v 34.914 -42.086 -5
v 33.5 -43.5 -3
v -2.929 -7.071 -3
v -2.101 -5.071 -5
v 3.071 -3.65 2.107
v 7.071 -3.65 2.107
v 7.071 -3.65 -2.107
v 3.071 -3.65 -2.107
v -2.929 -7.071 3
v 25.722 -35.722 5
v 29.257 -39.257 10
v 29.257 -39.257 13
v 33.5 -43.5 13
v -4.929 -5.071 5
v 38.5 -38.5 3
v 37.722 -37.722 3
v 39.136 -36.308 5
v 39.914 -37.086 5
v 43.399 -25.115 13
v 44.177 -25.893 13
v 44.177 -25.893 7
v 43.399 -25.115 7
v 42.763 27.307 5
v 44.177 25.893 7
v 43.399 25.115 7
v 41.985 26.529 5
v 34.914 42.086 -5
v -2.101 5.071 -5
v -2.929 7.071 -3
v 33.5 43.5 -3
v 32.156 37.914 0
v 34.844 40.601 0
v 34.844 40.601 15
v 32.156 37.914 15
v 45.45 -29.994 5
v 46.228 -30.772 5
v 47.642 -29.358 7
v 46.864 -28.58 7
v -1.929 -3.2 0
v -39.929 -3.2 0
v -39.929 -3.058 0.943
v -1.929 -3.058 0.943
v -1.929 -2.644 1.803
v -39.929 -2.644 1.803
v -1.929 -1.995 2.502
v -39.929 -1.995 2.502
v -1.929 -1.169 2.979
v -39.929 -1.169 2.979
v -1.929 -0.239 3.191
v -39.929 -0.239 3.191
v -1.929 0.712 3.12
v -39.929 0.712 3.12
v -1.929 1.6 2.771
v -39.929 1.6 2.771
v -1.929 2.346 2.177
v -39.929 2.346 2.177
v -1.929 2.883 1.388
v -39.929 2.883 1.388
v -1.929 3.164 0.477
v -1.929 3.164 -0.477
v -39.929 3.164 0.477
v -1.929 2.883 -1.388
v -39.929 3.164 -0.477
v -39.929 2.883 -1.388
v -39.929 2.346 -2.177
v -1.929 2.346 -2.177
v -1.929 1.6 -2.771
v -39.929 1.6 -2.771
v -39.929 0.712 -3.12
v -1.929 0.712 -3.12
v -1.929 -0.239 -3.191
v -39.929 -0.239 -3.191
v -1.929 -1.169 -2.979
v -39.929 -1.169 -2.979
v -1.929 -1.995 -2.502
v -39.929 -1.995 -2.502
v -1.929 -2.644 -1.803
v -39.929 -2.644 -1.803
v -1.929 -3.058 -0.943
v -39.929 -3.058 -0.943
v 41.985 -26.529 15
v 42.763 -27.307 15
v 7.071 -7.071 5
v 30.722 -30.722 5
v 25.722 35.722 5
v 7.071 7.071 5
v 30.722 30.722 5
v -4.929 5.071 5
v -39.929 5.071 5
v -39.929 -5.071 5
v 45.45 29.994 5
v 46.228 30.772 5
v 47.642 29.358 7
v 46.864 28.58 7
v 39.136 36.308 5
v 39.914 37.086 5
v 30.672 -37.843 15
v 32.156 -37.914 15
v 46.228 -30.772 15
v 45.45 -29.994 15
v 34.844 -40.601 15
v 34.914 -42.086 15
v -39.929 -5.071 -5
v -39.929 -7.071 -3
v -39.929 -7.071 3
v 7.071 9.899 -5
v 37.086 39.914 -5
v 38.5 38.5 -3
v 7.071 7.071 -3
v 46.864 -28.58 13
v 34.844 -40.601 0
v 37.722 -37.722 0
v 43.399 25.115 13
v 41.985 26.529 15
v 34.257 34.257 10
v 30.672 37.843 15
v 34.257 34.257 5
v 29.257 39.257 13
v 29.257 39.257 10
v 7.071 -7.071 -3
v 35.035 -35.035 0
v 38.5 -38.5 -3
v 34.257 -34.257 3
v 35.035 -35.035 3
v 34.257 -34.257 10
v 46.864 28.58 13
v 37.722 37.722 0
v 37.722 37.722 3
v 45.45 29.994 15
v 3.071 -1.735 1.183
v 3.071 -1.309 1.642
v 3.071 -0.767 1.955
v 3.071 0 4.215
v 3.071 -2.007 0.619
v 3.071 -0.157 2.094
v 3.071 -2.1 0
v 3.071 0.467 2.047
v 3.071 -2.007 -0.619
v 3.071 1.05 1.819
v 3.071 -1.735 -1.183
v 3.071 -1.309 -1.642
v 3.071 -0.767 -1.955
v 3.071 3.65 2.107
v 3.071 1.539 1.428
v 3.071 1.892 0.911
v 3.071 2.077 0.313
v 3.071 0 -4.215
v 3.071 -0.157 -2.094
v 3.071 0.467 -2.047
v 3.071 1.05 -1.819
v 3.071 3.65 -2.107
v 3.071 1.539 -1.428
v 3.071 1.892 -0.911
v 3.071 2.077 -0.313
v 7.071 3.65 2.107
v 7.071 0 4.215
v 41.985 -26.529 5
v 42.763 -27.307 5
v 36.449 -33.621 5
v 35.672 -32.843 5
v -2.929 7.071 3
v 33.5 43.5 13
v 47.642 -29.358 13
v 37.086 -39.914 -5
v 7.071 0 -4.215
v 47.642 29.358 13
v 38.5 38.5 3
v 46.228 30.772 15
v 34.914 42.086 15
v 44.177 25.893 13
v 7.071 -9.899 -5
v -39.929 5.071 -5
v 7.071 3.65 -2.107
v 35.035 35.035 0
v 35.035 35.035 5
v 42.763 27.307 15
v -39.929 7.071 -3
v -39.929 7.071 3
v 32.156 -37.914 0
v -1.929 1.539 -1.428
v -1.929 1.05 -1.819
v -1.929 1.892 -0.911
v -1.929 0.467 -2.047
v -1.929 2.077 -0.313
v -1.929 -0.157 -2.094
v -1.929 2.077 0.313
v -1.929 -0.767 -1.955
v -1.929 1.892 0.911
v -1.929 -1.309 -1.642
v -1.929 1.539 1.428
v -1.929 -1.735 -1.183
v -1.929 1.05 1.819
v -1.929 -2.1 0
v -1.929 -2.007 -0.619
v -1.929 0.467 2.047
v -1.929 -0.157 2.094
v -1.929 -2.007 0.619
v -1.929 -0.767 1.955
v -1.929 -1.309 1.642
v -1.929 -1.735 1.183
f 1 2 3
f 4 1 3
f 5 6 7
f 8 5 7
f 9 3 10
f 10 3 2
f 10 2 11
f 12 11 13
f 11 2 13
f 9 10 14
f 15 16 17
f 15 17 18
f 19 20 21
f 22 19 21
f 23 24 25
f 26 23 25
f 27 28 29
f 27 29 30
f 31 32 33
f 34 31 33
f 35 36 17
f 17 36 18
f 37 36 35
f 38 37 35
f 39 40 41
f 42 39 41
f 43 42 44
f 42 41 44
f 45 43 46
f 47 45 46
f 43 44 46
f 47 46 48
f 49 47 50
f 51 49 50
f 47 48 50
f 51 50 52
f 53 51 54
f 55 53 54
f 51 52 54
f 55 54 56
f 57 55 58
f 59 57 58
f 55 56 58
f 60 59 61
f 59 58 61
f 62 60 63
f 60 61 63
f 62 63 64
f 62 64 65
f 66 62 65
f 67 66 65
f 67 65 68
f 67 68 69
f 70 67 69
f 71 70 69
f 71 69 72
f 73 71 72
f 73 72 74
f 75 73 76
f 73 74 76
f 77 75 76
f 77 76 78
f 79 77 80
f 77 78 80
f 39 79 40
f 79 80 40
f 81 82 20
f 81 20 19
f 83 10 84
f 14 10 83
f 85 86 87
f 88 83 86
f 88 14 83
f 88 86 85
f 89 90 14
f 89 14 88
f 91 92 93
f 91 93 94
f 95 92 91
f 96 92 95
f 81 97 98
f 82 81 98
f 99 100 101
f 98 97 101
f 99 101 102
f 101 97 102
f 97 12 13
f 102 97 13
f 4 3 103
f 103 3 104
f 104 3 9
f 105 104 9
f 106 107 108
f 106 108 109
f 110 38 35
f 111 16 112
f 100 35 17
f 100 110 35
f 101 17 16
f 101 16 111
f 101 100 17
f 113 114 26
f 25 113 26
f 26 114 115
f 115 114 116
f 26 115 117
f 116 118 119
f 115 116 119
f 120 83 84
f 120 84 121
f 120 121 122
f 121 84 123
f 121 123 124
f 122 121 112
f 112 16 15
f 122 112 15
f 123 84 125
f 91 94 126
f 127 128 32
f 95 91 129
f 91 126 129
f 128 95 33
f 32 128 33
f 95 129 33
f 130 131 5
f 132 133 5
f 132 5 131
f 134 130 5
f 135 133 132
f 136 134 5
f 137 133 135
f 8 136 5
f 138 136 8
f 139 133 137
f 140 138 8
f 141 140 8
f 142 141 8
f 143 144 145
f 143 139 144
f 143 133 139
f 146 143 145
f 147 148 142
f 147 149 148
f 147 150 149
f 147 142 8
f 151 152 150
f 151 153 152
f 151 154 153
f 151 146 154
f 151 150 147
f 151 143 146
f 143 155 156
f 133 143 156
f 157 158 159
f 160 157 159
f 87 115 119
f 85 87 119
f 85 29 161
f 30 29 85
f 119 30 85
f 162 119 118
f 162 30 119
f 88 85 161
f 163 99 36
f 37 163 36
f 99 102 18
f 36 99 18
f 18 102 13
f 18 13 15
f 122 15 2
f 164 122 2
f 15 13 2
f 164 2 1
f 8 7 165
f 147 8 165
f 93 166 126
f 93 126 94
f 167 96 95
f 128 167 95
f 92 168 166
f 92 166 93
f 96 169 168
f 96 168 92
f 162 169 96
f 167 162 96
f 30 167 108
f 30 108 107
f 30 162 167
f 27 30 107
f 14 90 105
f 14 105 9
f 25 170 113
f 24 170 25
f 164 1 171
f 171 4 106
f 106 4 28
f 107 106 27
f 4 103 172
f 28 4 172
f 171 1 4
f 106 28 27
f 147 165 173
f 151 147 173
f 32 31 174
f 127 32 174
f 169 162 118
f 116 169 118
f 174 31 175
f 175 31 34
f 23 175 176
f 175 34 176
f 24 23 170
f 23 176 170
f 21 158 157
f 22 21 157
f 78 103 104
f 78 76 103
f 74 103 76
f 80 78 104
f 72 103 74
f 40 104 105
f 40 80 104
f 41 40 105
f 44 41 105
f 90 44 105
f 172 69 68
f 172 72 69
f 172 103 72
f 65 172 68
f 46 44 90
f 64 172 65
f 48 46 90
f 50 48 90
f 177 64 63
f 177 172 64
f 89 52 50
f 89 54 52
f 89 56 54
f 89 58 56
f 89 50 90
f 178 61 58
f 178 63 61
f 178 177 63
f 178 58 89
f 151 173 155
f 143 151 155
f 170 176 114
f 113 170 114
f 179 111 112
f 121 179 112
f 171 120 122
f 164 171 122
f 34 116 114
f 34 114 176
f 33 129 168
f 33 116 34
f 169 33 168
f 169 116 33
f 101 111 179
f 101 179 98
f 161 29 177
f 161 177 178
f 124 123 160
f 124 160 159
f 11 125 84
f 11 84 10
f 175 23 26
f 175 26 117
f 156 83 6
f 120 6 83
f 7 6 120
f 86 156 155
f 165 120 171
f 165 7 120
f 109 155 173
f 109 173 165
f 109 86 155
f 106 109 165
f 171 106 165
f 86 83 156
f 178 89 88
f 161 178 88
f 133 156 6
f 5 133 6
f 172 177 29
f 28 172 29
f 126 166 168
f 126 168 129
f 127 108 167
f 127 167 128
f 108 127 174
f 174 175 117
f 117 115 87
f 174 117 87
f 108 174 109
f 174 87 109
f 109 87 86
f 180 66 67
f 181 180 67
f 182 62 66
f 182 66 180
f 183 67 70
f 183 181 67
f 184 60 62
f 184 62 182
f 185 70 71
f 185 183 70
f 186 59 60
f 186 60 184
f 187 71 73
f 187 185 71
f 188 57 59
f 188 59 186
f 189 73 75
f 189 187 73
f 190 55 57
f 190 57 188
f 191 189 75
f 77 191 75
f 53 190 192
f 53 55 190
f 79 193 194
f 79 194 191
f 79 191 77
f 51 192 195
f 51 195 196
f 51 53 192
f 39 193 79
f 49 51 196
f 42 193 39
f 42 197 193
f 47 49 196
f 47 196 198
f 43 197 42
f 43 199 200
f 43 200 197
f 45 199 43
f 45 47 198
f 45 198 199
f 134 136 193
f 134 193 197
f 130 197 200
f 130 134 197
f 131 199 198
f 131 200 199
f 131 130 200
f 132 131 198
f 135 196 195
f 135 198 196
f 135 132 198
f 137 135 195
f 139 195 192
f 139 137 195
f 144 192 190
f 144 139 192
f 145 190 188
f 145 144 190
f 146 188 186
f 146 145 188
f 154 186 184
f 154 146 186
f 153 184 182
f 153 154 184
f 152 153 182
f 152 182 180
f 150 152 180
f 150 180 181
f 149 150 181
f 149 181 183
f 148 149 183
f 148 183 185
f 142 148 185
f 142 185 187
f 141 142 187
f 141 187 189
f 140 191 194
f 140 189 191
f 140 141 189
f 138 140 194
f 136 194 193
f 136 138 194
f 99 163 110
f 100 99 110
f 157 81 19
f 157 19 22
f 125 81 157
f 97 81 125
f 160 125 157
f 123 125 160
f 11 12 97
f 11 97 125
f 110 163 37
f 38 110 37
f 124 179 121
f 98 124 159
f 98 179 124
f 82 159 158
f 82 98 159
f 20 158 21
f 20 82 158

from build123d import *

# Parameters (mm, degrees)
EXTRUDE_1_DEPTH          = 5
CHAMFER_1_SIZE           = 10
CUT_EXTRUDE_1_DEPTH      = 61.279402969
CUT_EXTRUDE_1_DEPTH_BACK = 61.279402969
SKETCH_2_R               = 2.1
EXTRUDE_START            = 37
SKETCH_3_W               = 10
SKETCH_3_H               = 14.142135624
SKETCH_3_R               = 2.1
EXTRUDE_2_DEPTH          = 37
SKETCH_4_W               = 10
SKETCH_4_H               = 20
EXTRUDE_3_DEPTH          = 6
SKETCH_6_W               = 10
SKETCH_6_H               = 32
EXTRUDE_5_DEPTH          = 6
CUT_EXTRUDE_2_DEPTH      = 15
CUT_EXTRUDE_3_DEPTH      = 72.219678224
SKETCH_10_W              = 15
SKETCH_10_H              = 3.8
EXTRUDE_6_DEPTH          = 3
CHAMFER_2_SIZE           = 2
CHAMFER_3_SIZE           = 2
CHAMFER_4_SIZE           = 5
CHAMFER_5_SIZE           = 2
SKETCH_12_R              = 3.2
CUT_EXTRUDE_4_DEPTH      = 38
CUT_EXTRUDE_5_DEPTH      = 4


with BuildPart() as part:
    # 草图1 → 凸台-拉伸1 (new, symmetric)
    with BuildSketch(Plane.XY):
        Polygon((-10, 0), (33.5, 43.5), (38.5, 38.5), (0, 0), (38.5, -38.5), (33.5, -43.5), align=None)
    extrude(amount=EXTRUDE_1_DEPTH, both=True)

    # 倒角1
    chamfer_1_edges = [part.edges().sort_by_distance(p)[0] for p in [
        (-10, 0, 0),
        (0, 0, 0),
    ]]
    chamfer(chamfer_1_edges, length=CHAMFER_1_SIZE)

    # 草图2 → 切除-拉伸1 (cut, two sides: drawn at the far end of the back side and taken through both)
    with BuildSketch(Plane.ZY.offset(2.928932188).offset(-CUT_EXTRUDE_1_DEPTH_BACK)):
        with Locations(Location((0, 0, 0), (0, 0, 270))):
            Circle(SKETCH_2_R)
    extrude(amount=CUT_EXTRUDE_1_DEPTH + CUT_EXTRUDE_1_DEPTH_BACK, mode=Mode.SUBTRACT)

    # 草图3 → 凸台-拉伸2 (add)
    with BuildSketch(Plane.ZY.offset(2.928932188).offset(EXTRUDE_START)):
        Rectangle(SKETCH_3_W, SKETCH_3_H)
        with Locations(Location((0, 0, 0), (0, 0, 270))):
            Circle(SKETCH_3_R, mode=Mode.SUBTRACT)
    extrude(amount=-EXTRUDE_2_DEPTH)

    # 草图4 → 凸台-拉伸3 (add)
    with BuildSketch(Plane(origin=(38.5, 38.5, 0), x_dir=(0, 0, -1), z_dir=(0.7071067811865467, 0.7071067811865485, 0))):
        with Locations((-10, -2.928932188)):
            Rectangle(SKETCH_4_W, SKETCH_4_H)
    extrude_3 = extrude(amount=-EXTRUDE_3_DEPTH)

    # 草图6 → 凸台-拉伸5 (add)
    with BuildSketch(Plane(origin=(38.5, 38.5, 0), x_dir=(0, 0, -1), z_dir=(0.7071067811865467, 0.7071067811865485, 0))):
        with Locations((-10, 3.071067812)):
            Rectangle(SKETCH_6_W, SKETCH_6_H)
    extrude_5 = extrude(amount=-EXTRUDE_5_DEPTH)

    # 草图8 → 切除-拉伸2 (cut)
    with BuildSketch(Plane.XY.offset(15)):
        Polygon((21.549895398, 48.520458146), (44.177312396, 25.893041148), (46.864318164, 28.580046917), (24.236901166, 51.207463915), align=None)
    cut_extrude_2 = extrude(amount=-CUT_EXTRUDE_2_DEPTH, mode=Mode.SUBTRACT)

    # 草图9 → 切除-拉伸3 (cut, through all)
    with BuildSketch(Plane(origin=(0, 0, 5), x_dir=(-1, 0, 0), z_dir=(0, 0, -1))):
        Polygon((-32.722182541, 42.722182541), (-24.236901166, 51.207463915), (-25.014718626, 51.985281374), (-33.5, 43.5), align=None)
        Polygon((-21.549895398, 48.520458146), (-30.035176772, 40.035176772), (-29.257359313, 39.257359313), (-20.772077939, 47.742640687), align=None)
    cut_extrude_3 = extrude(amount=-CUT_EXTRUDE_3_DEPTH, mode=Mode.SUBTRACT)

    # 草图10 → 凸台-拉伸6 (add)
    with BuildSketch(Plane(origin=(-5, 5, 0), x_dir=(0, 0, 1), z_dir=(-0.7071067811865487, 0.7071067811865465, 0))):
        with Locations((7.5, 51.447222151)):
            Rectangle(SKETCH_10_W, SKETCH_10_H)
    extrude_6 = extrude(amount=-EXTRUDE_6_DEPTH)

    # 倒角2
    chamfer_2_edges = [part.edges().sort_by_distance(p)[0] for p in [
        (47.253226894, 28.968955647, 15),
        (31.378679656, 41.378679656, 15),
        (22.785533906, 22.785533906, -5),
        (43.788403666, 25.504132419, 5),
        (43.788403666, 25.504132419, 15),
        (15.285533906, 25.285533906, -5),
        (38.11109127, 38.11109127, 5),
        (47.253226894, 28.968955647, 5),
    ]]
    chamfer(chamfer_2_edges, length=CHAMFER_2_SIZE)

    # 镜向1: 凸台-拉伸3, 凸台-拉伸5, 切除-拉伸2, 切除-拉伸3, 凸台-拉伸6 across plane
    add(extrude_3.mirror(Plane.ZX))
    add(extrude_5.mirror(Plane.ZX))
    add(cut_extrude_2.mirror(Plane.ZX), mode=Mode.SUBTRACT)
    add(cut_extrude_3.mirror(Plane.ZX), mode=Mode.SUBTRACT)
    add(extrude_6.mirror(Plane.ZX))

    # 倒角3
    chamfer_3_edges = [part.edges().sort_by_distance(p)[0] for p in [
        (38.11109127, -38.11109127, 5),
        (15.285533906, -25.285533906, -5),
        (43.788403666, -25.504132419, 5),
        (43.788403666, -25.504132419, 15),
        (34.646268043, -34.646268043, 5),
        (47.253226894, -28.968955647, 5),
        (47.253226894, -28.968955647, 15),
        (31.378679656, -41.378679656, 15),
        (22.785533906, -22.785533906, -5),
    ]]
    chamfer(chamfer_3_edges, length=CHAMFER_3_SIZE)

    # 倒角4
    chamfer_4_edges = [part.edges().sort_by_distance(p)[0] for p in [
        (31.757359313, -36.757359313, 5),
        (31.757359313, 36.757359313, 5),
    ]]
    chamfer(chamfer_4_edges, length=CHAMFER_4_SIZE)

    # 倒角5
    chamfer_5_edges = [part.edges().sort_by_distance(p)[0] for p in [
        (-20.014718626, -7.071067812, -5),
        (-20.014718626, 7.071067812, -5),
        (-21.428932188, -7.071067812, 5),
        (-21.428932188, 7.071067812, 5),
    ]]
    chamfer(chamfer_5_edges, length=CHAMFER_5_SIZE)

    # 草图12 → 切除-拉伸4 (cut)
    with BuildSketch(Plane.ZY.offset(39.928932188)):
        with Locations(Location((0, 0, 0), (0, 0, 270))):
            Circle(SKETCH_12_R)
    extrude(amount=-CUT_EXTRUDE_4_DEPTH, mode=Mode.SUBTRACT)

    # 草图13 → 切除-拉伸5 (cut)
    with BuildSketch(Plane(origin=(7.071067812, 0, 0), x_dir=(0, 0, -1), z_dir=(1, 0, 0))):
        Polygon((2.107328483, -3.65), (4.214656965, 0), (2.107328483, 3.65), (-2.107328483, 3.65), (-4.214656965, 0), (-2.107328483, -3.65), align=None)
    extrude(amount=-CUT_EXTRUDE_5_DEPTH, mode=Mode.SUBTRACT)


solid = part.part
